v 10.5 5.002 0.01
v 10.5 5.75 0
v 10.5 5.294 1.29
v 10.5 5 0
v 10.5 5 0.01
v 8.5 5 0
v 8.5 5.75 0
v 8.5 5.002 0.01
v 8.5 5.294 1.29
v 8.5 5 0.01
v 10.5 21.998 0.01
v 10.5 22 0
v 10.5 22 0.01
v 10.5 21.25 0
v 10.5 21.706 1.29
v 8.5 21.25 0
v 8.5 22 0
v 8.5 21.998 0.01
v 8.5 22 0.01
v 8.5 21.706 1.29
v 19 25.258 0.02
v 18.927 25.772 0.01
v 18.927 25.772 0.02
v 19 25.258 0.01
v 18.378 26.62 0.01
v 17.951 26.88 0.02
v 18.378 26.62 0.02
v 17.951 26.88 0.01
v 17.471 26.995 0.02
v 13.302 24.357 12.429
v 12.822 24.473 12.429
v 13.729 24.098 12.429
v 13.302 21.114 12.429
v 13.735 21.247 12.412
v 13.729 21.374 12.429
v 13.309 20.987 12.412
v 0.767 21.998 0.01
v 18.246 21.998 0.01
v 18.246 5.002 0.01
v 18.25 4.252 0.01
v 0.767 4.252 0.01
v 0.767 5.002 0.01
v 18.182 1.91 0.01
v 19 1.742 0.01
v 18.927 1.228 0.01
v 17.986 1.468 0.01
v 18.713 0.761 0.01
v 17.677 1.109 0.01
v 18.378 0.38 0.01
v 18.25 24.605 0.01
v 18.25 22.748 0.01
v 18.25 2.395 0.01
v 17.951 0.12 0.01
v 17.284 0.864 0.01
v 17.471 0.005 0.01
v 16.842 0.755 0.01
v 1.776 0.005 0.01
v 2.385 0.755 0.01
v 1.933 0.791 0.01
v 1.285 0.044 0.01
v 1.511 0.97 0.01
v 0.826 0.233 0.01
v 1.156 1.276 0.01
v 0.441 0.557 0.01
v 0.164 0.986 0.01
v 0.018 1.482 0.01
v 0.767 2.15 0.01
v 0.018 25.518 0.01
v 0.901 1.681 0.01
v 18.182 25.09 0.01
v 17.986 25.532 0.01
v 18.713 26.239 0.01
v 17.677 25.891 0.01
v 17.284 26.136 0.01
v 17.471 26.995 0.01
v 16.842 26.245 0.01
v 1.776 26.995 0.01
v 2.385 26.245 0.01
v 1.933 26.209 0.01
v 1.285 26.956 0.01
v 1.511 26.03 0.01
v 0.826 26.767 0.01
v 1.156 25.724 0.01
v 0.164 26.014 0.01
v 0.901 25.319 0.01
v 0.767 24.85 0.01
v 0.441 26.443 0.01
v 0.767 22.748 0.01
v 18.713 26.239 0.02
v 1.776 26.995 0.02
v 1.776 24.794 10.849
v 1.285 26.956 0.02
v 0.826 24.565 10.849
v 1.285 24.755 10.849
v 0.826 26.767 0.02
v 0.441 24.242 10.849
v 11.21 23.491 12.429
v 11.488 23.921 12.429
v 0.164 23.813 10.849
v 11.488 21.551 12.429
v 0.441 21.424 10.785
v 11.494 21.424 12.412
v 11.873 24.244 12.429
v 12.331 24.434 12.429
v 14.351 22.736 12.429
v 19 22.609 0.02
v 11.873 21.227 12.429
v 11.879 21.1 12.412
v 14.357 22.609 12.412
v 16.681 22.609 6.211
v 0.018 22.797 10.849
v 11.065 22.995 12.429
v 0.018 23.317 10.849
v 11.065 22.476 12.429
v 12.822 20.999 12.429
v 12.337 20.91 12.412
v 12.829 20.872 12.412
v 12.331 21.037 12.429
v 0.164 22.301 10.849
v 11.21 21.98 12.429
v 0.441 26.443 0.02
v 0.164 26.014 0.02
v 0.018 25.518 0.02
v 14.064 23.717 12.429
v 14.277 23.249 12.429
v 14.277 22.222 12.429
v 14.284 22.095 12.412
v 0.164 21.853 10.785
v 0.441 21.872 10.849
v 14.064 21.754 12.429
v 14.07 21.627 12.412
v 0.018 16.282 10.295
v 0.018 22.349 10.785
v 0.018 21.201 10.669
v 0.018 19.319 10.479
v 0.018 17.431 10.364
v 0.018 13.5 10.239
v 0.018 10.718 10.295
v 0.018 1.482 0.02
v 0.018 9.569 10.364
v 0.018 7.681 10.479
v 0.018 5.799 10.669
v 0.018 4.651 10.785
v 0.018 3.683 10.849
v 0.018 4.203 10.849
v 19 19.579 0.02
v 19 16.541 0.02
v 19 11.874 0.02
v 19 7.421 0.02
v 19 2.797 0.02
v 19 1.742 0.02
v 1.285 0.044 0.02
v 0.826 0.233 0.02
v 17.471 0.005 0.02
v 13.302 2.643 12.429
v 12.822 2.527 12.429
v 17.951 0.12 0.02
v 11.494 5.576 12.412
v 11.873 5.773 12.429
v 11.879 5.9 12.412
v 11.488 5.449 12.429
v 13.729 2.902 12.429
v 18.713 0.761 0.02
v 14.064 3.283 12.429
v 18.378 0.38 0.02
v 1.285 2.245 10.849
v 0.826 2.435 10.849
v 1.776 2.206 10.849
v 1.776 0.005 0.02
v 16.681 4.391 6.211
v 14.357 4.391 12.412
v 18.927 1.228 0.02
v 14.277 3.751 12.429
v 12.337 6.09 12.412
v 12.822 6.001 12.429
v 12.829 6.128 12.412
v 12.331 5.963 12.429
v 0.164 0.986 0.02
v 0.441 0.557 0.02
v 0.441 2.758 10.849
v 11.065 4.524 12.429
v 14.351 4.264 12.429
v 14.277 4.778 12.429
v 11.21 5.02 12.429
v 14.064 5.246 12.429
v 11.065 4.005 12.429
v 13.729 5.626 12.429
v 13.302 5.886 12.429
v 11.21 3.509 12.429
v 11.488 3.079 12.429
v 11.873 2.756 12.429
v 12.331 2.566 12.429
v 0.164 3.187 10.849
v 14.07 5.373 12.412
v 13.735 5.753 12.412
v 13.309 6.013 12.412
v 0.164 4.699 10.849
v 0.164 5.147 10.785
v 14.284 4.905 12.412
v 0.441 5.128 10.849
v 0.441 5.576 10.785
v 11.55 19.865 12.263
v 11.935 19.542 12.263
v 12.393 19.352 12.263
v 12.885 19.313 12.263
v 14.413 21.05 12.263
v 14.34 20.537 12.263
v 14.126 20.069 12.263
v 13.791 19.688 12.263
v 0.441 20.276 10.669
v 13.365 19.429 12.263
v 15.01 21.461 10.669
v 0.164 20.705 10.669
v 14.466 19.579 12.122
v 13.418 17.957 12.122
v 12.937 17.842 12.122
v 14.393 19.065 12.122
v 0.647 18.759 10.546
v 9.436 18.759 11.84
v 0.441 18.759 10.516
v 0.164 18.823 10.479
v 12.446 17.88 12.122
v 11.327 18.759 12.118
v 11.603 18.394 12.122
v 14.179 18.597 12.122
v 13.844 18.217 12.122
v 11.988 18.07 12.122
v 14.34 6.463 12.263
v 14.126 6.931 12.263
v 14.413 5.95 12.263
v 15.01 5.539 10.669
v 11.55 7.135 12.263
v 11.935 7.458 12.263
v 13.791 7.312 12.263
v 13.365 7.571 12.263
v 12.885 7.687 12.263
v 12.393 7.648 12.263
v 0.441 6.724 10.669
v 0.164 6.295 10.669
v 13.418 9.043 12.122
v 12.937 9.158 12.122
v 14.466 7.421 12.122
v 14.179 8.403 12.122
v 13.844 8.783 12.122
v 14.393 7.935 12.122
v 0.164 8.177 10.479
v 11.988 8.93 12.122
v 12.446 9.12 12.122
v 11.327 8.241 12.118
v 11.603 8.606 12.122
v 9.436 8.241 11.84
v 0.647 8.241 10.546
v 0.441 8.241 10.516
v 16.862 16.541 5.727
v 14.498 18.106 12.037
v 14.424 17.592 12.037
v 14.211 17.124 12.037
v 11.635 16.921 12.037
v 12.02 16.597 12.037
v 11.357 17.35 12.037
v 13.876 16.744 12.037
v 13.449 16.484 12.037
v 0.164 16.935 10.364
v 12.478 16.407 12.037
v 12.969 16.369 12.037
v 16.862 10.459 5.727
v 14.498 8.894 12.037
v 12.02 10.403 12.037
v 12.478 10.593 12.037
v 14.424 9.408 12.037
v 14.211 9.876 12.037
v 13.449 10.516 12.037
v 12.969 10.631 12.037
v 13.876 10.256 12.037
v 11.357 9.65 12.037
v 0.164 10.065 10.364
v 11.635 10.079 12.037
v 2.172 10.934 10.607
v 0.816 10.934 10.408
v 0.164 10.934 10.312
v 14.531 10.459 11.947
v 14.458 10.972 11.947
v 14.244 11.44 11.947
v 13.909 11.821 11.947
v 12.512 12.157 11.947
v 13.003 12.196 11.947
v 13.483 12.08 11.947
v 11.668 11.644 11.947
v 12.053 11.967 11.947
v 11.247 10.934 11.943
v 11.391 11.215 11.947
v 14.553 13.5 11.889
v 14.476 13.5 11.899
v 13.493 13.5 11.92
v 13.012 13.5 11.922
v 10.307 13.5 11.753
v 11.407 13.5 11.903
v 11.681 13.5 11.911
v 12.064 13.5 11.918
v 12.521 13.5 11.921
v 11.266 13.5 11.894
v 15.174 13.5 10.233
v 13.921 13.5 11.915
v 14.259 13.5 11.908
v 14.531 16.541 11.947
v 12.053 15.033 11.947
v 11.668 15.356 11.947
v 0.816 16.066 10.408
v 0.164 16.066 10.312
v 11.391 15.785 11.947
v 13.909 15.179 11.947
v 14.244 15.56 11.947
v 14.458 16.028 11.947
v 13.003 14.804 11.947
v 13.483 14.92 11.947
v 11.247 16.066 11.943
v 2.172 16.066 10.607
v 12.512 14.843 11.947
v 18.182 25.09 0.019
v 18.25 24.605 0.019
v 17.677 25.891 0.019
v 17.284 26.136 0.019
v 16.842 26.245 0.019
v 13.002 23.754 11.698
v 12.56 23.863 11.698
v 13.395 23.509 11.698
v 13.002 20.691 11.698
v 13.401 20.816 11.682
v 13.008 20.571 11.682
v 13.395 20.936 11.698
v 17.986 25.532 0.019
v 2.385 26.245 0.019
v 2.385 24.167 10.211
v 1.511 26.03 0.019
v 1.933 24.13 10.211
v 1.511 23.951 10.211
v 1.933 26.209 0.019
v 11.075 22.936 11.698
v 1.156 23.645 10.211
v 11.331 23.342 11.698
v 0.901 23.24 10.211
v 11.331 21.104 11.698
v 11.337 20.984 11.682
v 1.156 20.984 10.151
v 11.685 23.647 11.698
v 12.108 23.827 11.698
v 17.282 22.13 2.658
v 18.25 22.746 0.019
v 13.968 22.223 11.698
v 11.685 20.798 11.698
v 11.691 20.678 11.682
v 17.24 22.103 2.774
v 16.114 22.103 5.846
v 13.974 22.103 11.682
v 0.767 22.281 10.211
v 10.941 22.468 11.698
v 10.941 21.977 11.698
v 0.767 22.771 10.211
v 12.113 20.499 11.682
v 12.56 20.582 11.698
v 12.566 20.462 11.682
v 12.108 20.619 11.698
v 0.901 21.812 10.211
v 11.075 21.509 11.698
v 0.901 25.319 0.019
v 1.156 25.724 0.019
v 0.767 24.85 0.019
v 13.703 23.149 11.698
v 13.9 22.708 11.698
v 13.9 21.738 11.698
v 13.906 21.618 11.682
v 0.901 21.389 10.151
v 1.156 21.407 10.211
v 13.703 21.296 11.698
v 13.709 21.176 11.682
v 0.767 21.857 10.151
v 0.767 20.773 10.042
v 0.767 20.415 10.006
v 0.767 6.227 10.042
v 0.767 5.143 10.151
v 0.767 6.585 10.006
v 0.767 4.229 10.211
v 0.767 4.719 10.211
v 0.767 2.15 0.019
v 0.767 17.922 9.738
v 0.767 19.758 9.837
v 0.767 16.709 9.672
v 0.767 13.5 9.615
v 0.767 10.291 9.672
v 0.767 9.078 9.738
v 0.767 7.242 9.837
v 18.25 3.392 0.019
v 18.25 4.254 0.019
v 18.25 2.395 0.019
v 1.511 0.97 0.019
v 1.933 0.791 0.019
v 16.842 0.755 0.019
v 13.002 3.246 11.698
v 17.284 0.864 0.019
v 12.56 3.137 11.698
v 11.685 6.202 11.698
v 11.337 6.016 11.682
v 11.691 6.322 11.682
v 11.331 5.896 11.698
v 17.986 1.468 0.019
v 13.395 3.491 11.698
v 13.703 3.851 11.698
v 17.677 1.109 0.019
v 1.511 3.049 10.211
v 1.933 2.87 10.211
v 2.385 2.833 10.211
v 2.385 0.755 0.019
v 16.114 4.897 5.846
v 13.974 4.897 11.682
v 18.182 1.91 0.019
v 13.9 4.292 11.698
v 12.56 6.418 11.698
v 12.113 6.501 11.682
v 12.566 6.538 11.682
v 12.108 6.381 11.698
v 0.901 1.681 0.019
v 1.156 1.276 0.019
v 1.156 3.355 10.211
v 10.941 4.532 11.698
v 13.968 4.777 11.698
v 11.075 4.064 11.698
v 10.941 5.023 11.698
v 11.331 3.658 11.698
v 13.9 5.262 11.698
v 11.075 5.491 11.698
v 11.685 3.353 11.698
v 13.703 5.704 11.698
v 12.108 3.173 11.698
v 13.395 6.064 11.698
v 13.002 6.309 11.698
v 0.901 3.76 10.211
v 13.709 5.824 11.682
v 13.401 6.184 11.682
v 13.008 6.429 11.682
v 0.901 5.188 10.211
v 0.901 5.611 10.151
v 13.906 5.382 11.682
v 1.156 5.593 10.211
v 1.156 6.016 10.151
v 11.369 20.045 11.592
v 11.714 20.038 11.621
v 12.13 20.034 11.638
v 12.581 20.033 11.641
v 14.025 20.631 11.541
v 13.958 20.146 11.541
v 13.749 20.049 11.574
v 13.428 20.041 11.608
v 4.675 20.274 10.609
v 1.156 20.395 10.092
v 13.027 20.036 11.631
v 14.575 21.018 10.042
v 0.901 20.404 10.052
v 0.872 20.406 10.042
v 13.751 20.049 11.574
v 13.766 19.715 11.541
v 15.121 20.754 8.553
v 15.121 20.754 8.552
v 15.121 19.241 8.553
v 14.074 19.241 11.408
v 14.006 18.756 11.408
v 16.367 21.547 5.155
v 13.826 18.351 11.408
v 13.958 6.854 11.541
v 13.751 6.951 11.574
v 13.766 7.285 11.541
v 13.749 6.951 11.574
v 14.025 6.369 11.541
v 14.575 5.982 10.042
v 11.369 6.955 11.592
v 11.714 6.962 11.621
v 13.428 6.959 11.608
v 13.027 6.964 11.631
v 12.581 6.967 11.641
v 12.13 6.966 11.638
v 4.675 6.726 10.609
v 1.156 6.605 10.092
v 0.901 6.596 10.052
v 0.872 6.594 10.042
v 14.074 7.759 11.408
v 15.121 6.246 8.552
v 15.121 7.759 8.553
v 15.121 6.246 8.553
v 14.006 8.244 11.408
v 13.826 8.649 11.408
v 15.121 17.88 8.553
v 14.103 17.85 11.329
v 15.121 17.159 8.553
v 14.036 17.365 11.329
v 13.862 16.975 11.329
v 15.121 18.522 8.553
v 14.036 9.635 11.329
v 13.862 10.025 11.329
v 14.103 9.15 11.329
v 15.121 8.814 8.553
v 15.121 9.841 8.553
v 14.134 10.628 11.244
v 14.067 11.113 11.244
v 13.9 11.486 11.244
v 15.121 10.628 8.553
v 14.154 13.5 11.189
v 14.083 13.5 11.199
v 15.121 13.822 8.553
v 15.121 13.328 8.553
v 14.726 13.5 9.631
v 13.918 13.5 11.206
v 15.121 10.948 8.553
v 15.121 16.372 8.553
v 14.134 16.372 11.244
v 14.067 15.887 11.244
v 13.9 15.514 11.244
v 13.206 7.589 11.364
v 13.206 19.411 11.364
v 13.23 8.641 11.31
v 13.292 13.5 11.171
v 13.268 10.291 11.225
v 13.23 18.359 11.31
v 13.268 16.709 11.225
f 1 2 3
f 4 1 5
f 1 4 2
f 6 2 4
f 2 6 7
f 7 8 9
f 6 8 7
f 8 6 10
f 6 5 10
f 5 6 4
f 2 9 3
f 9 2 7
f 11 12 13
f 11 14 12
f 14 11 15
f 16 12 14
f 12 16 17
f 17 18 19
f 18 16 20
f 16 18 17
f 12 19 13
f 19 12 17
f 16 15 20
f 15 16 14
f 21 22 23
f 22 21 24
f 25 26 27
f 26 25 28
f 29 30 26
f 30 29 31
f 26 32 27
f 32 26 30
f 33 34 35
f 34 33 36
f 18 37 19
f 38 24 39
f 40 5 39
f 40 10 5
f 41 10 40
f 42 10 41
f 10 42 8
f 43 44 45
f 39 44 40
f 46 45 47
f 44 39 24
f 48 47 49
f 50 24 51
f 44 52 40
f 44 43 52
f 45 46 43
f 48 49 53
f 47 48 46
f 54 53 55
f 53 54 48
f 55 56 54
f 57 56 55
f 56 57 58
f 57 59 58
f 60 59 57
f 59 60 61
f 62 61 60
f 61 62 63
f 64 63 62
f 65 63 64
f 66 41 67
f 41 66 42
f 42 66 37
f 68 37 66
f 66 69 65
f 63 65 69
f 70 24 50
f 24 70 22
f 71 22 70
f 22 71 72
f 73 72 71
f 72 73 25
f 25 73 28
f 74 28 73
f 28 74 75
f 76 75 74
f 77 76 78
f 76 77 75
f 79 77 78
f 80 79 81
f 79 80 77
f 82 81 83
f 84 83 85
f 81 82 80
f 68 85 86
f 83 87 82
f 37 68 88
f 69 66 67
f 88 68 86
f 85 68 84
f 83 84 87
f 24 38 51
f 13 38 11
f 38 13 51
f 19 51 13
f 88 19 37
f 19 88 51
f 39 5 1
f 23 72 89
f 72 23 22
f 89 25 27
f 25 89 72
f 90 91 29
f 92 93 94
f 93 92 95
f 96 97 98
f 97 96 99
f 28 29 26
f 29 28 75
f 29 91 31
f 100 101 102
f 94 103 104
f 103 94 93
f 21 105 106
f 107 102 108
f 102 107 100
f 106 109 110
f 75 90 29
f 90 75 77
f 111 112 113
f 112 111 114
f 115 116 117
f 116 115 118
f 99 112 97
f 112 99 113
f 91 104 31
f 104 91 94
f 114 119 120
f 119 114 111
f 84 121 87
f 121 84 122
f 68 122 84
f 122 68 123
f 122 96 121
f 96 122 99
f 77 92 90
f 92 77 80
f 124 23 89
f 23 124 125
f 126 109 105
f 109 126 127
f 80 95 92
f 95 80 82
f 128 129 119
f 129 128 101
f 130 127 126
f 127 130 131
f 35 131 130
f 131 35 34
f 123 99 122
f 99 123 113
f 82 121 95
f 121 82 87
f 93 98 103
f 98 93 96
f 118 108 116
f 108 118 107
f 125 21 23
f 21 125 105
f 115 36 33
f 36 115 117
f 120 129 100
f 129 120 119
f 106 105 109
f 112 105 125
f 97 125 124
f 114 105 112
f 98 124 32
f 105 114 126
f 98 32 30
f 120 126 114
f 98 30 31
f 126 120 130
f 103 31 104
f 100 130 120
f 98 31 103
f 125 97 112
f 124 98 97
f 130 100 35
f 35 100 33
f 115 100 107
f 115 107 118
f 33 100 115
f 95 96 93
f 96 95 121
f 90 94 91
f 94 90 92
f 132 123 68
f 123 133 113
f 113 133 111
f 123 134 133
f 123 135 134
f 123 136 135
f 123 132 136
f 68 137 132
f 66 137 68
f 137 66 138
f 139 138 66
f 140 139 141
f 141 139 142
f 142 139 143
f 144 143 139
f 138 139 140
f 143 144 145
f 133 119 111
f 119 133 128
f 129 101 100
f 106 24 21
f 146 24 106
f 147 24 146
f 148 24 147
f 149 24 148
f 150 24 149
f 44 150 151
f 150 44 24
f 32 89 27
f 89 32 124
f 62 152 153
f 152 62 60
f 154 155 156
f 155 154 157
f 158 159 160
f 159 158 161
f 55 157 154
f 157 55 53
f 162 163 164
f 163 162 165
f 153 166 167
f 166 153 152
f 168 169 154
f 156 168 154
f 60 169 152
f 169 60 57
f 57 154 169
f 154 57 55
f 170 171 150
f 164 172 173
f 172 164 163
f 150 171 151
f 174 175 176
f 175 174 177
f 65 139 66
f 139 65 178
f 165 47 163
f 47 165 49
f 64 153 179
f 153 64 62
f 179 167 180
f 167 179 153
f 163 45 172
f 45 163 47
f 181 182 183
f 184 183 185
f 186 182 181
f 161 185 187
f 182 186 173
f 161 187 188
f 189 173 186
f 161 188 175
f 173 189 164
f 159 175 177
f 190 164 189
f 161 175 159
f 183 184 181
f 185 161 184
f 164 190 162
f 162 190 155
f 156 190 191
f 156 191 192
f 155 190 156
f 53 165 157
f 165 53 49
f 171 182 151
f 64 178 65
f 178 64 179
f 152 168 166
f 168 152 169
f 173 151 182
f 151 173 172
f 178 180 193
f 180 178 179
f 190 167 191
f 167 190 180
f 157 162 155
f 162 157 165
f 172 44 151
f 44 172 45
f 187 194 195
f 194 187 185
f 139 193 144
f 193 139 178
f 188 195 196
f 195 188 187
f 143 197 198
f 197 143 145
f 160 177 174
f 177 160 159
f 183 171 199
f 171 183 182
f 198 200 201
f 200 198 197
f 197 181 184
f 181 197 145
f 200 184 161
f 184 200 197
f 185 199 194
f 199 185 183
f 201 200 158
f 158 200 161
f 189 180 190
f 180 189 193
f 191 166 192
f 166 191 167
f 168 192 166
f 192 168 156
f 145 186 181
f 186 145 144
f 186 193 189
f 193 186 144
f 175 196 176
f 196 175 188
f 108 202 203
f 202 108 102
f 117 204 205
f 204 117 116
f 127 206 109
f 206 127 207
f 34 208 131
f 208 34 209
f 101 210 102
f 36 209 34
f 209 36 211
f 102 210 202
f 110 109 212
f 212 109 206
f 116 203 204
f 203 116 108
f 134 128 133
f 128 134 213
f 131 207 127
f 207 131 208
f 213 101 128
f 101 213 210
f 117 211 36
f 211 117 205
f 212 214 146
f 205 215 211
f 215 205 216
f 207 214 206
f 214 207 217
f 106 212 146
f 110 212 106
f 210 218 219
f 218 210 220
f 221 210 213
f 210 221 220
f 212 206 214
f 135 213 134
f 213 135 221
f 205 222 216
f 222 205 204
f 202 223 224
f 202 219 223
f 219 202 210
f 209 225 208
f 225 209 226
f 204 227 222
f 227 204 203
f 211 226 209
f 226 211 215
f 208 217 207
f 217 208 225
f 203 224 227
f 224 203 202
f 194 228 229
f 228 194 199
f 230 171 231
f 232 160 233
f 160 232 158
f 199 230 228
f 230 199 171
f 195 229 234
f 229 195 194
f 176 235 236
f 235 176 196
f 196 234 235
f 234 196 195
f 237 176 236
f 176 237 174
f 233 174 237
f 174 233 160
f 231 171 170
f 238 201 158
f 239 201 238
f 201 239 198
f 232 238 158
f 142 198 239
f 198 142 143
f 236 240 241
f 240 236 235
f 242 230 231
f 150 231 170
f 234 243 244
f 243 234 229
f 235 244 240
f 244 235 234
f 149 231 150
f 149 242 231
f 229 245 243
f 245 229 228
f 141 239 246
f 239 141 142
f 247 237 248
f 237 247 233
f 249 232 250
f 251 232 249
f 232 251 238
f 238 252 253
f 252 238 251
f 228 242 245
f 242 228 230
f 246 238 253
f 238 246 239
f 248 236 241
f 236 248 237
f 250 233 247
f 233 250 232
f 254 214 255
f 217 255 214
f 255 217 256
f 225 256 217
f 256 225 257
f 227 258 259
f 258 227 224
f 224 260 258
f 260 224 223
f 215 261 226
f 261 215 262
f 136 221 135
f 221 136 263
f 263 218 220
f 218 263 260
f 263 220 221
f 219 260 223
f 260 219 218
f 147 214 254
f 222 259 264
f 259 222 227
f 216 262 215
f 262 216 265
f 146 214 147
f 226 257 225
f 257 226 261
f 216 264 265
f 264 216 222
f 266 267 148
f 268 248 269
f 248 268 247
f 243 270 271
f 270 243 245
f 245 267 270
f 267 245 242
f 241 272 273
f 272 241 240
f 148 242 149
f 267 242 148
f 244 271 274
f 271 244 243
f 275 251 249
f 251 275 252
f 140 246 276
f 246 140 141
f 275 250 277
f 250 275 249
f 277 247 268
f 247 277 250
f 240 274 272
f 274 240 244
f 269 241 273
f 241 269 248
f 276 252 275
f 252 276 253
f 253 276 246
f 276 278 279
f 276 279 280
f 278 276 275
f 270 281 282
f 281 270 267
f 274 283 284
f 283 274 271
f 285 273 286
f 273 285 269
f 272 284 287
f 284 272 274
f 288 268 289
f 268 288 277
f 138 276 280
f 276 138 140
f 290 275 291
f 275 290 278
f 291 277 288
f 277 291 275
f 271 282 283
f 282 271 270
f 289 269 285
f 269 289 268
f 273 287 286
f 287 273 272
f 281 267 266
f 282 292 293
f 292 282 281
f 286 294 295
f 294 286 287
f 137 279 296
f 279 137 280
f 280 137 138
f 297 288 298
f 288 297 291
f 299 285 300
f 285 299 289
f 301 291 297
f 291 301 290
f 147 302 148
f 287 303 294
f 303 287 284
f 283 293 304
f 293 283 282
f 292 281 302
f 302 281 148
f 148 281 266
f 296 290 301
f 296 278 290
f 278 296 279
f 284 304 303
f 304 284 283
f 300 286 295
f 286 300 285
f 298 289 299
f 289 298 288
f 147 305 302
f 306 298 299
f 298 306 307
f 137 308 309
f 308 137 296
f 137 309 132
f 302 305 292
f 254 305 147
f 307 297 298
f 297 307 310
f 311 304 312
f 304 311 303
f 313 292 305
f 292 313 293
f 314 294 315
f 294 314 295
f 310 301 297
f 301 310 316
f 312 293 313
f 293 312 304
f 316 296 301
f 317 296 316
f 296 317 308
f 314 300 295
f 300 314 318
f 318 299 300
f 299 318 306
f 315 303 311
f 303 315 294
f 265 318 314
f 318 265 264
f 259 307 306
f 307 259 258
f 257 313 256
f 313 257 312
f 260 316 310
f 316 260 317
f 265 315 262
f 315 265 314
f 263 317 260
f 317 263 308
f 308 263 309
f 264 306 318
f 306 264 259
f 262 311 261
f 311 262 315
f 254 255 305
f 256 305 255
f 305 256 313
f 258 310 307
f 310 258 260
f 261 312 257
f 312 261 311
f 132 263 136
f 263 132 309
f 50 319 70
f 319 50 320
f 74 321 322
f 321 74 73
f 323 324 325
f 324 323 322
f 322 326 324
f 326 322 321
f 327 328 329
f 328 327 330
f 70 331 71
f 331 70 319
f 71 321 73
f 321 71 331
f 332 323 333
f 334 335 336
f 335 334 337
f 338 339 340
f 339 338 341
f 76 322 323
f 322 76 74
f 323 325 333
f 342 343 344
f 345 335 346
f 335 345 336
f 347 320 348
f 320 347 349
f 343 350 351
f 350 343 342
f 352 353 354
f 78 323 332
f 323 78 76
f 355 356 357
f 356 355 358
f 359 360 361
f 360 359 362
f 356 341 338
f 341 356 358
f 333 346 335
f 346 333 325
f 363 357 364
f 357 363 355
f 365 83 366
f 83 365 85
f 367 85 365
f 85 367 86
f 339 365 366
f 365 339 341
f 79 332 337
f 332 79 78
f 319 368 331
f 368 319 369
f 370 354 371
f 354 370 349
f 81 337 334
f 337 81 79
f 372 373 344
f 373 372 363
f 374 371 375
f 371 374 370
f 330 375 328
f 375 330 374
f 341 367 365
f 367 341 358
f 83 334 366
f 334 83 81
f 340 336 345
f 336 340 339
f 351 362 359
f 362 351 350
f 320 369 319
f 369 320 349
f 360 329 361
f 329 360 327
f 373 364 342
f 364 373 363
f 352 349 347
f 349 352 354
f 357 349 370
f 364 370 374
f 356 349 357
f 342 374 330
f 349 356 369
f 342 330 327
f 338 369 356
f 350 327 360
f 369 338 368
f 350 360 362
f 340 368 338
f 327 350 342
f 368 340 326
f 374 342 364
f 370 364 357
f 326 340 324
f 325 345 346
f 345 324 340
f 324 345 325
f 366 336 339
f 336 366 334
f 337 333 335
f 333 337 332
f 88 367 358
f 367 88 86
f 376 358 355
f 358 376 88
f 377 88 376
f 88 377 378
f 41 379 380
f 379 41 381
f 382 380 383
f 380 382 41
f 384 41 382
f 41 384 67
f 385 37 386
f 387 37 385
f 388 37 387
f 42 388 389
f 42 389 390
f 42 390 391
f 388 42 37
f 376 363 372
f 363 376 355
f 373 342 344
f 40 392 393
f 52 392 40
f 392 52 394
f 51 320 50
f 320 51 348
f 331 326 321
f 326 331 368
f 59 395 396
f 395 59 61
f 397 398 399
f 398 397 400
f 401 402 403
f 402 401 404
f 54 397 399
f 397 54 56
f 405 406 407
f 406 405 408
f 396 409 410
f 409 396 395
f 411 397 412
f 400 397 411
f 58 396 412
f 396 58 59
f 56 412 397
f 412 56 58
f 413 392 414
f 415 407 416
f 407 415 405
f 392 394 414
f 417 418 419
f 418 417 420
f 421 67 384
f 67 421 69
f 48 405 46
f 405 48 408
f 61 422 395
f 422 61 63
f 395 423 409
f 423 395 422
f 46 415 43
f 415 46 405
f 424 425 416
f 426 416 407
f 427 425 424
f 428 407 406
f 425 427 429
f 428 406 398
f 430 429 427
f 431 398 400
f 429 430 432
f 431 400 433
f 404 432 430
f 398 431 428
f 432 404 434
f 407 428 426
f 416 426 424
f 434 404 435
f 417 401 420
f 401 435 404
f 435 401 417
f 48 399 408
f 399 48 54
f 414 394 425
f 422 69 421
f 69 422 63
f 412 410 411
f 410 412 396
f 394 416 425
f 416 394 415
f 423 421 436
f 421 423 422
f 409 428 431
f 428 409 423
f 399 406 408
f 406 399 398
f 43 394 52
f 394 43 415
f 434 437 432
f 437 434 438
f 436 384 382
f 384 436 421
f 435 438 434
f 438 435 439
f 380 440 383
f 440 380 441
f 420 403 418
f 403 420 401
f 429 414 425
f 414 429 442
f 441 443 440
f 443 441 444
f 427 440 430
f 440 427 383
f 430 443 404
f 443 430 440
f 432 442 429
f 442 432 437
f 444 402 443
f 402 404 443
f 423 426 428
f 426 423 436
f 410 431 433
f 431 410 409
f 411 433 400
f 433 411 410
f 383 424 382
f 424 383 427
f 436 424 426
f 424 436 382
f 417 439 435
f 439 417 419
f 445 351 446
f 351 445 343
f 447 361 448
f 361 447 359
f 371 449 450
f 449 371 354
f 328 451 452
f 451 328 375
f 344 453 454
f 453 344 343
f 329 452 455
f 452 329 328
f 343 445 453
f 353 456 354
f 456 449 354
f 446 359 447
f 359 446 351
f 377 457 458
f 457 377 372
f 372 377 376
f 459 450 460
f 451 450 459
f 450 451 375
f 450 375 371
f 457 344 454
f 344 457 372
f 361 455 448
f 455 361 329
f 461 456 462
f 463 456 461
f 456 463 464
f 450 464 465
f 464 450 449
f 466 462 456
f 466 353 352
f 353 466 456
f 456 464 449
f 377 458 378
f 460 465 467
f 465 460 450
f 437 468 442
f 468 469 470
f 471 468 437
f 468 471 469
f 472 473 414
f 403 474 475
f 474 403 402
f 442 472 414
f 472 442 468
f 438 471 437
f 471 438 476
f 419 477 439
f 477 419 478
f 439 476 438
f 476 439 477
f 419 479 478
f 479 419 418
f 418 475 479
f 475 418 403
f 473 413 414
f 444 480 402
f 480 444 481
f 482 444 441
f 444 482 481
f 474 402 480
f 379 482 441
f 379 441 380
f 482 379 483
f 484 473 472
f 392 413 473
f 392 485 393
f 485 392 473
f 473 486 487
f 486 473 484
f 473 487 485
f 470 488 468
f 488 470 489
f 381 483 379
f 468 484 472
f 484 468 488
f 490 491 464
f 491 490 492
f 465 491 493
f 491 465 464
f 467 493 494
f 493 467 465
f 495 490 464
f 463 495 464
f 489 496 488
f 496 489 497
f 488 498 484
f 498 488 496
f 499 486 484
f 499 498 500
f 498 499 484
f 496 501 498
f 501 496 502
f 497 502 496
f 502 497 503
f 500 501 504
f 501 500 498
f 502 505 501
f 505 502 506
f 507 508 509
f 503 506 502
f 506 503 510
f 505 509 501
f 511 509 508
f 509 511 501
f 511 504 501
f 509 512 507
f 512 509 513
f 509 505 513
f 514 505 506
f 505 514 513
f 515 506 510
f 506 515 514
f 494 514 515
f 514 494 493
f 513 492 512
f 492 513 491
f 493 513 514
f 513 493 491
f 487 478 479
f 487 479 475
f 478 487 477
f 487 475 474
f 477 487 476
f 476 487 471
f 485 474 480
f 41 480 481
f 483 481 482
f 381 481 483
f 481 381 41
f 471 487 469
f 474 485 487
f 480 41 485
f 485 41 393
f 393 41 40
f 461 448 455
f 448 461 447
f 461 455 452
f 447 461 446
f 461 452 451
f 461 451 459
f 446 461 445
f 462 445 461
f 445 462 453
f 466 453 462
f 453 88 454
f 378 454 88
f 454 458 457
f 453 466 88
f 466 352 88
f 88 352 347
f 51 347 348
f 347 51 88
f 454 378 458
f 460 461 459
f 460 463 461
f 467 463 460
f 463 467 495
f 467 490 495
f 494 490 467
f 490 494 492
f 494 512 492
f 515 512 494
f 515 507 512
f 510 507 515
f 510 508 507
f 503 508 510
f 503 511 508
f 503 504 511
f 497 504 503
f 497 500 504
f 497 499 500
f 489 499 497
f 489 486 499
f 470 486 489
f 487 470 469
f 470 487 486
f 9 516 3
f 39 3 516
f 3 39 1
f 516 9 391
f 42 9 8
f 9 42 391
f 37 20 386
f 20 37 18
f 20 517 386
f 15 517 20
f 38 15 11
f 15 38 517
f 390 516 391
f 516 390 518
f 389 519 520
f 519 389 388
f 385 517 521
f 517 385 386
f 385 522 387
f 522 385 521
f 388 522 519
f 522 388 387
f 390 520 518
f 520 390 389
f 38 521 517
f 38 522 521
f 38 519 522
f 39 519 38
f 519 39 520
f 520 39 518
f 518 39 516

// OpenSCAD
//measures are in millimeters
AY=27.0;
AX=19.0;
INNER_AY=18.5;
INNER_BY=12.5;
BY=22.0;
BLX=14.5;
EZ=11.0;
FLZ=14.0;
H=12.75;
CYL_OFF_Z=100;
CYL_DEPTH=0.05;
CLIP_X=2;
CLIP_Y=0.75;
CLIP_H=3*CLIP_Y;
CLIP_DISTANCE=17.0;
CORNER_RADIUS=2;

WallThickness=0.75;
ClipWidth=2.2;
ClipDepth=0.75;

//ascfront=FLZ/sqrt(pow(FLZ,2)-pow(H,2));
//asctop=(H-EZ)/sqrt(pow(BLX,2)-pow((H-EZ),2));

//curve control rod
//translate([14,4,0]) cube([1,1,H]);

alpha=asin((H-EZ)/BLX);
beta=asin(H/FLZ);
gamma=90-asin((0.5*(AY-BY))/EZ);

module keycap(){
	scale([AX/(AX+2*CORNER_RADIUS),AY/(AY+2*CORNER_RADIUS),1])
	translate([CORNER_RADIUS,CORNER_RADIUS,0.01])
	minkowski(){
		difference(){
			cube([AX,AY,H]);
			rotate(a=gamma,v=[1,0,0]) cube([100,100,100]);
			translate([0,AY,0]) rotate(a=90-gamma,v=[1,0,0]) cube([100,100,100]);
			translate([0,0,EZ]) rotate(a=-alpha,v=[0,1,0]) translate([-50,0,0]) cube([100,100,100]);
			translate([0,AY/2,EZ+CYL_OFF_Z]) rotate(a=90-alpha,v=[0,1,0]) cylinder(h=100,center=true,r=CYL_OFF_Z+CYL_DEPTH,$fa=2);
			translate([AX,0,0]) rotate(a=beta-90,v=[0,1,0]) cube([100,100,100]);
		}
		cylinder(h=0.01,r=CORNER_RADIUS,$fs=0.6);
		//rotate(a=90,v=[1,0,0]) cylinder(h=0.01,r=1,$fs=0.3);
	}
}

module struts(){
	difference(){
		cube([AX,INNER_AY,H]);
		rotate(a=gamma,v=[1,0,0]) cube([100,100,100]);
		translate([0,INNER_AY,0]) rotate(a=90-gamma,v=[1,0,0]) cube([100,100,100]);
		translate([0,0,EZ]) rotate(a=-alpha,v=[0,1,0]) translate([-50,0,0]) cube([100,100,100]);
		translate([0,INNER_AY/2,EZ+CYL_OFF_Z]) rotate(a=90-alpha,v=[0,1,0]) cylinder(h=100,center=true,r=CYL_OFF_Z+CYL_DEPTH,$fa=2);
		translate([AX,0,0]) rotate(a=beta-90,v=[0,1,0]) cube([100,100,100]);
	}
}

module clip(){
	difference(){
		cube([CLIP_X,CLIP_Y,CLIP_H]);
		translate([0,CLIP_Y,0]) rotate(a=asin(CLIP_Y/CLIP_H),v=[1,0,0]) cube([100,100,100]);
	}
}

//clip distance control rod
//translate([(AX-CLIP_X)/2,(AY-CLIP_DISTANCE)/2,0]) cube([1,CLIP_DISTANCE,1]);
translate([(AX-CLIP_X)/2,(AY-CLIP_DISTANCE)/2,0]) clip();
translate([(AX-CLIP_X)/2,(AY+CLIP_DISTANCE)/2,0]) mirror([0,1,0]) clip();

difference(){
	keycap();
	difference(){
		translate([WallThickness, WallThickness, 0]) scale(v=[1-2*WallThickness/AX, 1-2*WallThickness/AY, 1-WallThickness/H]) keycap();
		translate([0,(AY-INNER_AY)/2,0]) difference(){
			struts();
			translate([WallThickness, WallThickness, 0]) scale(v=[1-2*WallThickness/AX, 1-2*WallThickness/INNER_AY, 1-WallThickness/H]) struts();
		}
		//translate([0,(AY-CLIP_DISTANCE)/2-WallThickness,0]) cube([100,WallThickness, 100]);
		//translate([0,(AY+CLIP_DISTANCE)/2,0]) cube([100,WallThickness, 100]);
	}
}
